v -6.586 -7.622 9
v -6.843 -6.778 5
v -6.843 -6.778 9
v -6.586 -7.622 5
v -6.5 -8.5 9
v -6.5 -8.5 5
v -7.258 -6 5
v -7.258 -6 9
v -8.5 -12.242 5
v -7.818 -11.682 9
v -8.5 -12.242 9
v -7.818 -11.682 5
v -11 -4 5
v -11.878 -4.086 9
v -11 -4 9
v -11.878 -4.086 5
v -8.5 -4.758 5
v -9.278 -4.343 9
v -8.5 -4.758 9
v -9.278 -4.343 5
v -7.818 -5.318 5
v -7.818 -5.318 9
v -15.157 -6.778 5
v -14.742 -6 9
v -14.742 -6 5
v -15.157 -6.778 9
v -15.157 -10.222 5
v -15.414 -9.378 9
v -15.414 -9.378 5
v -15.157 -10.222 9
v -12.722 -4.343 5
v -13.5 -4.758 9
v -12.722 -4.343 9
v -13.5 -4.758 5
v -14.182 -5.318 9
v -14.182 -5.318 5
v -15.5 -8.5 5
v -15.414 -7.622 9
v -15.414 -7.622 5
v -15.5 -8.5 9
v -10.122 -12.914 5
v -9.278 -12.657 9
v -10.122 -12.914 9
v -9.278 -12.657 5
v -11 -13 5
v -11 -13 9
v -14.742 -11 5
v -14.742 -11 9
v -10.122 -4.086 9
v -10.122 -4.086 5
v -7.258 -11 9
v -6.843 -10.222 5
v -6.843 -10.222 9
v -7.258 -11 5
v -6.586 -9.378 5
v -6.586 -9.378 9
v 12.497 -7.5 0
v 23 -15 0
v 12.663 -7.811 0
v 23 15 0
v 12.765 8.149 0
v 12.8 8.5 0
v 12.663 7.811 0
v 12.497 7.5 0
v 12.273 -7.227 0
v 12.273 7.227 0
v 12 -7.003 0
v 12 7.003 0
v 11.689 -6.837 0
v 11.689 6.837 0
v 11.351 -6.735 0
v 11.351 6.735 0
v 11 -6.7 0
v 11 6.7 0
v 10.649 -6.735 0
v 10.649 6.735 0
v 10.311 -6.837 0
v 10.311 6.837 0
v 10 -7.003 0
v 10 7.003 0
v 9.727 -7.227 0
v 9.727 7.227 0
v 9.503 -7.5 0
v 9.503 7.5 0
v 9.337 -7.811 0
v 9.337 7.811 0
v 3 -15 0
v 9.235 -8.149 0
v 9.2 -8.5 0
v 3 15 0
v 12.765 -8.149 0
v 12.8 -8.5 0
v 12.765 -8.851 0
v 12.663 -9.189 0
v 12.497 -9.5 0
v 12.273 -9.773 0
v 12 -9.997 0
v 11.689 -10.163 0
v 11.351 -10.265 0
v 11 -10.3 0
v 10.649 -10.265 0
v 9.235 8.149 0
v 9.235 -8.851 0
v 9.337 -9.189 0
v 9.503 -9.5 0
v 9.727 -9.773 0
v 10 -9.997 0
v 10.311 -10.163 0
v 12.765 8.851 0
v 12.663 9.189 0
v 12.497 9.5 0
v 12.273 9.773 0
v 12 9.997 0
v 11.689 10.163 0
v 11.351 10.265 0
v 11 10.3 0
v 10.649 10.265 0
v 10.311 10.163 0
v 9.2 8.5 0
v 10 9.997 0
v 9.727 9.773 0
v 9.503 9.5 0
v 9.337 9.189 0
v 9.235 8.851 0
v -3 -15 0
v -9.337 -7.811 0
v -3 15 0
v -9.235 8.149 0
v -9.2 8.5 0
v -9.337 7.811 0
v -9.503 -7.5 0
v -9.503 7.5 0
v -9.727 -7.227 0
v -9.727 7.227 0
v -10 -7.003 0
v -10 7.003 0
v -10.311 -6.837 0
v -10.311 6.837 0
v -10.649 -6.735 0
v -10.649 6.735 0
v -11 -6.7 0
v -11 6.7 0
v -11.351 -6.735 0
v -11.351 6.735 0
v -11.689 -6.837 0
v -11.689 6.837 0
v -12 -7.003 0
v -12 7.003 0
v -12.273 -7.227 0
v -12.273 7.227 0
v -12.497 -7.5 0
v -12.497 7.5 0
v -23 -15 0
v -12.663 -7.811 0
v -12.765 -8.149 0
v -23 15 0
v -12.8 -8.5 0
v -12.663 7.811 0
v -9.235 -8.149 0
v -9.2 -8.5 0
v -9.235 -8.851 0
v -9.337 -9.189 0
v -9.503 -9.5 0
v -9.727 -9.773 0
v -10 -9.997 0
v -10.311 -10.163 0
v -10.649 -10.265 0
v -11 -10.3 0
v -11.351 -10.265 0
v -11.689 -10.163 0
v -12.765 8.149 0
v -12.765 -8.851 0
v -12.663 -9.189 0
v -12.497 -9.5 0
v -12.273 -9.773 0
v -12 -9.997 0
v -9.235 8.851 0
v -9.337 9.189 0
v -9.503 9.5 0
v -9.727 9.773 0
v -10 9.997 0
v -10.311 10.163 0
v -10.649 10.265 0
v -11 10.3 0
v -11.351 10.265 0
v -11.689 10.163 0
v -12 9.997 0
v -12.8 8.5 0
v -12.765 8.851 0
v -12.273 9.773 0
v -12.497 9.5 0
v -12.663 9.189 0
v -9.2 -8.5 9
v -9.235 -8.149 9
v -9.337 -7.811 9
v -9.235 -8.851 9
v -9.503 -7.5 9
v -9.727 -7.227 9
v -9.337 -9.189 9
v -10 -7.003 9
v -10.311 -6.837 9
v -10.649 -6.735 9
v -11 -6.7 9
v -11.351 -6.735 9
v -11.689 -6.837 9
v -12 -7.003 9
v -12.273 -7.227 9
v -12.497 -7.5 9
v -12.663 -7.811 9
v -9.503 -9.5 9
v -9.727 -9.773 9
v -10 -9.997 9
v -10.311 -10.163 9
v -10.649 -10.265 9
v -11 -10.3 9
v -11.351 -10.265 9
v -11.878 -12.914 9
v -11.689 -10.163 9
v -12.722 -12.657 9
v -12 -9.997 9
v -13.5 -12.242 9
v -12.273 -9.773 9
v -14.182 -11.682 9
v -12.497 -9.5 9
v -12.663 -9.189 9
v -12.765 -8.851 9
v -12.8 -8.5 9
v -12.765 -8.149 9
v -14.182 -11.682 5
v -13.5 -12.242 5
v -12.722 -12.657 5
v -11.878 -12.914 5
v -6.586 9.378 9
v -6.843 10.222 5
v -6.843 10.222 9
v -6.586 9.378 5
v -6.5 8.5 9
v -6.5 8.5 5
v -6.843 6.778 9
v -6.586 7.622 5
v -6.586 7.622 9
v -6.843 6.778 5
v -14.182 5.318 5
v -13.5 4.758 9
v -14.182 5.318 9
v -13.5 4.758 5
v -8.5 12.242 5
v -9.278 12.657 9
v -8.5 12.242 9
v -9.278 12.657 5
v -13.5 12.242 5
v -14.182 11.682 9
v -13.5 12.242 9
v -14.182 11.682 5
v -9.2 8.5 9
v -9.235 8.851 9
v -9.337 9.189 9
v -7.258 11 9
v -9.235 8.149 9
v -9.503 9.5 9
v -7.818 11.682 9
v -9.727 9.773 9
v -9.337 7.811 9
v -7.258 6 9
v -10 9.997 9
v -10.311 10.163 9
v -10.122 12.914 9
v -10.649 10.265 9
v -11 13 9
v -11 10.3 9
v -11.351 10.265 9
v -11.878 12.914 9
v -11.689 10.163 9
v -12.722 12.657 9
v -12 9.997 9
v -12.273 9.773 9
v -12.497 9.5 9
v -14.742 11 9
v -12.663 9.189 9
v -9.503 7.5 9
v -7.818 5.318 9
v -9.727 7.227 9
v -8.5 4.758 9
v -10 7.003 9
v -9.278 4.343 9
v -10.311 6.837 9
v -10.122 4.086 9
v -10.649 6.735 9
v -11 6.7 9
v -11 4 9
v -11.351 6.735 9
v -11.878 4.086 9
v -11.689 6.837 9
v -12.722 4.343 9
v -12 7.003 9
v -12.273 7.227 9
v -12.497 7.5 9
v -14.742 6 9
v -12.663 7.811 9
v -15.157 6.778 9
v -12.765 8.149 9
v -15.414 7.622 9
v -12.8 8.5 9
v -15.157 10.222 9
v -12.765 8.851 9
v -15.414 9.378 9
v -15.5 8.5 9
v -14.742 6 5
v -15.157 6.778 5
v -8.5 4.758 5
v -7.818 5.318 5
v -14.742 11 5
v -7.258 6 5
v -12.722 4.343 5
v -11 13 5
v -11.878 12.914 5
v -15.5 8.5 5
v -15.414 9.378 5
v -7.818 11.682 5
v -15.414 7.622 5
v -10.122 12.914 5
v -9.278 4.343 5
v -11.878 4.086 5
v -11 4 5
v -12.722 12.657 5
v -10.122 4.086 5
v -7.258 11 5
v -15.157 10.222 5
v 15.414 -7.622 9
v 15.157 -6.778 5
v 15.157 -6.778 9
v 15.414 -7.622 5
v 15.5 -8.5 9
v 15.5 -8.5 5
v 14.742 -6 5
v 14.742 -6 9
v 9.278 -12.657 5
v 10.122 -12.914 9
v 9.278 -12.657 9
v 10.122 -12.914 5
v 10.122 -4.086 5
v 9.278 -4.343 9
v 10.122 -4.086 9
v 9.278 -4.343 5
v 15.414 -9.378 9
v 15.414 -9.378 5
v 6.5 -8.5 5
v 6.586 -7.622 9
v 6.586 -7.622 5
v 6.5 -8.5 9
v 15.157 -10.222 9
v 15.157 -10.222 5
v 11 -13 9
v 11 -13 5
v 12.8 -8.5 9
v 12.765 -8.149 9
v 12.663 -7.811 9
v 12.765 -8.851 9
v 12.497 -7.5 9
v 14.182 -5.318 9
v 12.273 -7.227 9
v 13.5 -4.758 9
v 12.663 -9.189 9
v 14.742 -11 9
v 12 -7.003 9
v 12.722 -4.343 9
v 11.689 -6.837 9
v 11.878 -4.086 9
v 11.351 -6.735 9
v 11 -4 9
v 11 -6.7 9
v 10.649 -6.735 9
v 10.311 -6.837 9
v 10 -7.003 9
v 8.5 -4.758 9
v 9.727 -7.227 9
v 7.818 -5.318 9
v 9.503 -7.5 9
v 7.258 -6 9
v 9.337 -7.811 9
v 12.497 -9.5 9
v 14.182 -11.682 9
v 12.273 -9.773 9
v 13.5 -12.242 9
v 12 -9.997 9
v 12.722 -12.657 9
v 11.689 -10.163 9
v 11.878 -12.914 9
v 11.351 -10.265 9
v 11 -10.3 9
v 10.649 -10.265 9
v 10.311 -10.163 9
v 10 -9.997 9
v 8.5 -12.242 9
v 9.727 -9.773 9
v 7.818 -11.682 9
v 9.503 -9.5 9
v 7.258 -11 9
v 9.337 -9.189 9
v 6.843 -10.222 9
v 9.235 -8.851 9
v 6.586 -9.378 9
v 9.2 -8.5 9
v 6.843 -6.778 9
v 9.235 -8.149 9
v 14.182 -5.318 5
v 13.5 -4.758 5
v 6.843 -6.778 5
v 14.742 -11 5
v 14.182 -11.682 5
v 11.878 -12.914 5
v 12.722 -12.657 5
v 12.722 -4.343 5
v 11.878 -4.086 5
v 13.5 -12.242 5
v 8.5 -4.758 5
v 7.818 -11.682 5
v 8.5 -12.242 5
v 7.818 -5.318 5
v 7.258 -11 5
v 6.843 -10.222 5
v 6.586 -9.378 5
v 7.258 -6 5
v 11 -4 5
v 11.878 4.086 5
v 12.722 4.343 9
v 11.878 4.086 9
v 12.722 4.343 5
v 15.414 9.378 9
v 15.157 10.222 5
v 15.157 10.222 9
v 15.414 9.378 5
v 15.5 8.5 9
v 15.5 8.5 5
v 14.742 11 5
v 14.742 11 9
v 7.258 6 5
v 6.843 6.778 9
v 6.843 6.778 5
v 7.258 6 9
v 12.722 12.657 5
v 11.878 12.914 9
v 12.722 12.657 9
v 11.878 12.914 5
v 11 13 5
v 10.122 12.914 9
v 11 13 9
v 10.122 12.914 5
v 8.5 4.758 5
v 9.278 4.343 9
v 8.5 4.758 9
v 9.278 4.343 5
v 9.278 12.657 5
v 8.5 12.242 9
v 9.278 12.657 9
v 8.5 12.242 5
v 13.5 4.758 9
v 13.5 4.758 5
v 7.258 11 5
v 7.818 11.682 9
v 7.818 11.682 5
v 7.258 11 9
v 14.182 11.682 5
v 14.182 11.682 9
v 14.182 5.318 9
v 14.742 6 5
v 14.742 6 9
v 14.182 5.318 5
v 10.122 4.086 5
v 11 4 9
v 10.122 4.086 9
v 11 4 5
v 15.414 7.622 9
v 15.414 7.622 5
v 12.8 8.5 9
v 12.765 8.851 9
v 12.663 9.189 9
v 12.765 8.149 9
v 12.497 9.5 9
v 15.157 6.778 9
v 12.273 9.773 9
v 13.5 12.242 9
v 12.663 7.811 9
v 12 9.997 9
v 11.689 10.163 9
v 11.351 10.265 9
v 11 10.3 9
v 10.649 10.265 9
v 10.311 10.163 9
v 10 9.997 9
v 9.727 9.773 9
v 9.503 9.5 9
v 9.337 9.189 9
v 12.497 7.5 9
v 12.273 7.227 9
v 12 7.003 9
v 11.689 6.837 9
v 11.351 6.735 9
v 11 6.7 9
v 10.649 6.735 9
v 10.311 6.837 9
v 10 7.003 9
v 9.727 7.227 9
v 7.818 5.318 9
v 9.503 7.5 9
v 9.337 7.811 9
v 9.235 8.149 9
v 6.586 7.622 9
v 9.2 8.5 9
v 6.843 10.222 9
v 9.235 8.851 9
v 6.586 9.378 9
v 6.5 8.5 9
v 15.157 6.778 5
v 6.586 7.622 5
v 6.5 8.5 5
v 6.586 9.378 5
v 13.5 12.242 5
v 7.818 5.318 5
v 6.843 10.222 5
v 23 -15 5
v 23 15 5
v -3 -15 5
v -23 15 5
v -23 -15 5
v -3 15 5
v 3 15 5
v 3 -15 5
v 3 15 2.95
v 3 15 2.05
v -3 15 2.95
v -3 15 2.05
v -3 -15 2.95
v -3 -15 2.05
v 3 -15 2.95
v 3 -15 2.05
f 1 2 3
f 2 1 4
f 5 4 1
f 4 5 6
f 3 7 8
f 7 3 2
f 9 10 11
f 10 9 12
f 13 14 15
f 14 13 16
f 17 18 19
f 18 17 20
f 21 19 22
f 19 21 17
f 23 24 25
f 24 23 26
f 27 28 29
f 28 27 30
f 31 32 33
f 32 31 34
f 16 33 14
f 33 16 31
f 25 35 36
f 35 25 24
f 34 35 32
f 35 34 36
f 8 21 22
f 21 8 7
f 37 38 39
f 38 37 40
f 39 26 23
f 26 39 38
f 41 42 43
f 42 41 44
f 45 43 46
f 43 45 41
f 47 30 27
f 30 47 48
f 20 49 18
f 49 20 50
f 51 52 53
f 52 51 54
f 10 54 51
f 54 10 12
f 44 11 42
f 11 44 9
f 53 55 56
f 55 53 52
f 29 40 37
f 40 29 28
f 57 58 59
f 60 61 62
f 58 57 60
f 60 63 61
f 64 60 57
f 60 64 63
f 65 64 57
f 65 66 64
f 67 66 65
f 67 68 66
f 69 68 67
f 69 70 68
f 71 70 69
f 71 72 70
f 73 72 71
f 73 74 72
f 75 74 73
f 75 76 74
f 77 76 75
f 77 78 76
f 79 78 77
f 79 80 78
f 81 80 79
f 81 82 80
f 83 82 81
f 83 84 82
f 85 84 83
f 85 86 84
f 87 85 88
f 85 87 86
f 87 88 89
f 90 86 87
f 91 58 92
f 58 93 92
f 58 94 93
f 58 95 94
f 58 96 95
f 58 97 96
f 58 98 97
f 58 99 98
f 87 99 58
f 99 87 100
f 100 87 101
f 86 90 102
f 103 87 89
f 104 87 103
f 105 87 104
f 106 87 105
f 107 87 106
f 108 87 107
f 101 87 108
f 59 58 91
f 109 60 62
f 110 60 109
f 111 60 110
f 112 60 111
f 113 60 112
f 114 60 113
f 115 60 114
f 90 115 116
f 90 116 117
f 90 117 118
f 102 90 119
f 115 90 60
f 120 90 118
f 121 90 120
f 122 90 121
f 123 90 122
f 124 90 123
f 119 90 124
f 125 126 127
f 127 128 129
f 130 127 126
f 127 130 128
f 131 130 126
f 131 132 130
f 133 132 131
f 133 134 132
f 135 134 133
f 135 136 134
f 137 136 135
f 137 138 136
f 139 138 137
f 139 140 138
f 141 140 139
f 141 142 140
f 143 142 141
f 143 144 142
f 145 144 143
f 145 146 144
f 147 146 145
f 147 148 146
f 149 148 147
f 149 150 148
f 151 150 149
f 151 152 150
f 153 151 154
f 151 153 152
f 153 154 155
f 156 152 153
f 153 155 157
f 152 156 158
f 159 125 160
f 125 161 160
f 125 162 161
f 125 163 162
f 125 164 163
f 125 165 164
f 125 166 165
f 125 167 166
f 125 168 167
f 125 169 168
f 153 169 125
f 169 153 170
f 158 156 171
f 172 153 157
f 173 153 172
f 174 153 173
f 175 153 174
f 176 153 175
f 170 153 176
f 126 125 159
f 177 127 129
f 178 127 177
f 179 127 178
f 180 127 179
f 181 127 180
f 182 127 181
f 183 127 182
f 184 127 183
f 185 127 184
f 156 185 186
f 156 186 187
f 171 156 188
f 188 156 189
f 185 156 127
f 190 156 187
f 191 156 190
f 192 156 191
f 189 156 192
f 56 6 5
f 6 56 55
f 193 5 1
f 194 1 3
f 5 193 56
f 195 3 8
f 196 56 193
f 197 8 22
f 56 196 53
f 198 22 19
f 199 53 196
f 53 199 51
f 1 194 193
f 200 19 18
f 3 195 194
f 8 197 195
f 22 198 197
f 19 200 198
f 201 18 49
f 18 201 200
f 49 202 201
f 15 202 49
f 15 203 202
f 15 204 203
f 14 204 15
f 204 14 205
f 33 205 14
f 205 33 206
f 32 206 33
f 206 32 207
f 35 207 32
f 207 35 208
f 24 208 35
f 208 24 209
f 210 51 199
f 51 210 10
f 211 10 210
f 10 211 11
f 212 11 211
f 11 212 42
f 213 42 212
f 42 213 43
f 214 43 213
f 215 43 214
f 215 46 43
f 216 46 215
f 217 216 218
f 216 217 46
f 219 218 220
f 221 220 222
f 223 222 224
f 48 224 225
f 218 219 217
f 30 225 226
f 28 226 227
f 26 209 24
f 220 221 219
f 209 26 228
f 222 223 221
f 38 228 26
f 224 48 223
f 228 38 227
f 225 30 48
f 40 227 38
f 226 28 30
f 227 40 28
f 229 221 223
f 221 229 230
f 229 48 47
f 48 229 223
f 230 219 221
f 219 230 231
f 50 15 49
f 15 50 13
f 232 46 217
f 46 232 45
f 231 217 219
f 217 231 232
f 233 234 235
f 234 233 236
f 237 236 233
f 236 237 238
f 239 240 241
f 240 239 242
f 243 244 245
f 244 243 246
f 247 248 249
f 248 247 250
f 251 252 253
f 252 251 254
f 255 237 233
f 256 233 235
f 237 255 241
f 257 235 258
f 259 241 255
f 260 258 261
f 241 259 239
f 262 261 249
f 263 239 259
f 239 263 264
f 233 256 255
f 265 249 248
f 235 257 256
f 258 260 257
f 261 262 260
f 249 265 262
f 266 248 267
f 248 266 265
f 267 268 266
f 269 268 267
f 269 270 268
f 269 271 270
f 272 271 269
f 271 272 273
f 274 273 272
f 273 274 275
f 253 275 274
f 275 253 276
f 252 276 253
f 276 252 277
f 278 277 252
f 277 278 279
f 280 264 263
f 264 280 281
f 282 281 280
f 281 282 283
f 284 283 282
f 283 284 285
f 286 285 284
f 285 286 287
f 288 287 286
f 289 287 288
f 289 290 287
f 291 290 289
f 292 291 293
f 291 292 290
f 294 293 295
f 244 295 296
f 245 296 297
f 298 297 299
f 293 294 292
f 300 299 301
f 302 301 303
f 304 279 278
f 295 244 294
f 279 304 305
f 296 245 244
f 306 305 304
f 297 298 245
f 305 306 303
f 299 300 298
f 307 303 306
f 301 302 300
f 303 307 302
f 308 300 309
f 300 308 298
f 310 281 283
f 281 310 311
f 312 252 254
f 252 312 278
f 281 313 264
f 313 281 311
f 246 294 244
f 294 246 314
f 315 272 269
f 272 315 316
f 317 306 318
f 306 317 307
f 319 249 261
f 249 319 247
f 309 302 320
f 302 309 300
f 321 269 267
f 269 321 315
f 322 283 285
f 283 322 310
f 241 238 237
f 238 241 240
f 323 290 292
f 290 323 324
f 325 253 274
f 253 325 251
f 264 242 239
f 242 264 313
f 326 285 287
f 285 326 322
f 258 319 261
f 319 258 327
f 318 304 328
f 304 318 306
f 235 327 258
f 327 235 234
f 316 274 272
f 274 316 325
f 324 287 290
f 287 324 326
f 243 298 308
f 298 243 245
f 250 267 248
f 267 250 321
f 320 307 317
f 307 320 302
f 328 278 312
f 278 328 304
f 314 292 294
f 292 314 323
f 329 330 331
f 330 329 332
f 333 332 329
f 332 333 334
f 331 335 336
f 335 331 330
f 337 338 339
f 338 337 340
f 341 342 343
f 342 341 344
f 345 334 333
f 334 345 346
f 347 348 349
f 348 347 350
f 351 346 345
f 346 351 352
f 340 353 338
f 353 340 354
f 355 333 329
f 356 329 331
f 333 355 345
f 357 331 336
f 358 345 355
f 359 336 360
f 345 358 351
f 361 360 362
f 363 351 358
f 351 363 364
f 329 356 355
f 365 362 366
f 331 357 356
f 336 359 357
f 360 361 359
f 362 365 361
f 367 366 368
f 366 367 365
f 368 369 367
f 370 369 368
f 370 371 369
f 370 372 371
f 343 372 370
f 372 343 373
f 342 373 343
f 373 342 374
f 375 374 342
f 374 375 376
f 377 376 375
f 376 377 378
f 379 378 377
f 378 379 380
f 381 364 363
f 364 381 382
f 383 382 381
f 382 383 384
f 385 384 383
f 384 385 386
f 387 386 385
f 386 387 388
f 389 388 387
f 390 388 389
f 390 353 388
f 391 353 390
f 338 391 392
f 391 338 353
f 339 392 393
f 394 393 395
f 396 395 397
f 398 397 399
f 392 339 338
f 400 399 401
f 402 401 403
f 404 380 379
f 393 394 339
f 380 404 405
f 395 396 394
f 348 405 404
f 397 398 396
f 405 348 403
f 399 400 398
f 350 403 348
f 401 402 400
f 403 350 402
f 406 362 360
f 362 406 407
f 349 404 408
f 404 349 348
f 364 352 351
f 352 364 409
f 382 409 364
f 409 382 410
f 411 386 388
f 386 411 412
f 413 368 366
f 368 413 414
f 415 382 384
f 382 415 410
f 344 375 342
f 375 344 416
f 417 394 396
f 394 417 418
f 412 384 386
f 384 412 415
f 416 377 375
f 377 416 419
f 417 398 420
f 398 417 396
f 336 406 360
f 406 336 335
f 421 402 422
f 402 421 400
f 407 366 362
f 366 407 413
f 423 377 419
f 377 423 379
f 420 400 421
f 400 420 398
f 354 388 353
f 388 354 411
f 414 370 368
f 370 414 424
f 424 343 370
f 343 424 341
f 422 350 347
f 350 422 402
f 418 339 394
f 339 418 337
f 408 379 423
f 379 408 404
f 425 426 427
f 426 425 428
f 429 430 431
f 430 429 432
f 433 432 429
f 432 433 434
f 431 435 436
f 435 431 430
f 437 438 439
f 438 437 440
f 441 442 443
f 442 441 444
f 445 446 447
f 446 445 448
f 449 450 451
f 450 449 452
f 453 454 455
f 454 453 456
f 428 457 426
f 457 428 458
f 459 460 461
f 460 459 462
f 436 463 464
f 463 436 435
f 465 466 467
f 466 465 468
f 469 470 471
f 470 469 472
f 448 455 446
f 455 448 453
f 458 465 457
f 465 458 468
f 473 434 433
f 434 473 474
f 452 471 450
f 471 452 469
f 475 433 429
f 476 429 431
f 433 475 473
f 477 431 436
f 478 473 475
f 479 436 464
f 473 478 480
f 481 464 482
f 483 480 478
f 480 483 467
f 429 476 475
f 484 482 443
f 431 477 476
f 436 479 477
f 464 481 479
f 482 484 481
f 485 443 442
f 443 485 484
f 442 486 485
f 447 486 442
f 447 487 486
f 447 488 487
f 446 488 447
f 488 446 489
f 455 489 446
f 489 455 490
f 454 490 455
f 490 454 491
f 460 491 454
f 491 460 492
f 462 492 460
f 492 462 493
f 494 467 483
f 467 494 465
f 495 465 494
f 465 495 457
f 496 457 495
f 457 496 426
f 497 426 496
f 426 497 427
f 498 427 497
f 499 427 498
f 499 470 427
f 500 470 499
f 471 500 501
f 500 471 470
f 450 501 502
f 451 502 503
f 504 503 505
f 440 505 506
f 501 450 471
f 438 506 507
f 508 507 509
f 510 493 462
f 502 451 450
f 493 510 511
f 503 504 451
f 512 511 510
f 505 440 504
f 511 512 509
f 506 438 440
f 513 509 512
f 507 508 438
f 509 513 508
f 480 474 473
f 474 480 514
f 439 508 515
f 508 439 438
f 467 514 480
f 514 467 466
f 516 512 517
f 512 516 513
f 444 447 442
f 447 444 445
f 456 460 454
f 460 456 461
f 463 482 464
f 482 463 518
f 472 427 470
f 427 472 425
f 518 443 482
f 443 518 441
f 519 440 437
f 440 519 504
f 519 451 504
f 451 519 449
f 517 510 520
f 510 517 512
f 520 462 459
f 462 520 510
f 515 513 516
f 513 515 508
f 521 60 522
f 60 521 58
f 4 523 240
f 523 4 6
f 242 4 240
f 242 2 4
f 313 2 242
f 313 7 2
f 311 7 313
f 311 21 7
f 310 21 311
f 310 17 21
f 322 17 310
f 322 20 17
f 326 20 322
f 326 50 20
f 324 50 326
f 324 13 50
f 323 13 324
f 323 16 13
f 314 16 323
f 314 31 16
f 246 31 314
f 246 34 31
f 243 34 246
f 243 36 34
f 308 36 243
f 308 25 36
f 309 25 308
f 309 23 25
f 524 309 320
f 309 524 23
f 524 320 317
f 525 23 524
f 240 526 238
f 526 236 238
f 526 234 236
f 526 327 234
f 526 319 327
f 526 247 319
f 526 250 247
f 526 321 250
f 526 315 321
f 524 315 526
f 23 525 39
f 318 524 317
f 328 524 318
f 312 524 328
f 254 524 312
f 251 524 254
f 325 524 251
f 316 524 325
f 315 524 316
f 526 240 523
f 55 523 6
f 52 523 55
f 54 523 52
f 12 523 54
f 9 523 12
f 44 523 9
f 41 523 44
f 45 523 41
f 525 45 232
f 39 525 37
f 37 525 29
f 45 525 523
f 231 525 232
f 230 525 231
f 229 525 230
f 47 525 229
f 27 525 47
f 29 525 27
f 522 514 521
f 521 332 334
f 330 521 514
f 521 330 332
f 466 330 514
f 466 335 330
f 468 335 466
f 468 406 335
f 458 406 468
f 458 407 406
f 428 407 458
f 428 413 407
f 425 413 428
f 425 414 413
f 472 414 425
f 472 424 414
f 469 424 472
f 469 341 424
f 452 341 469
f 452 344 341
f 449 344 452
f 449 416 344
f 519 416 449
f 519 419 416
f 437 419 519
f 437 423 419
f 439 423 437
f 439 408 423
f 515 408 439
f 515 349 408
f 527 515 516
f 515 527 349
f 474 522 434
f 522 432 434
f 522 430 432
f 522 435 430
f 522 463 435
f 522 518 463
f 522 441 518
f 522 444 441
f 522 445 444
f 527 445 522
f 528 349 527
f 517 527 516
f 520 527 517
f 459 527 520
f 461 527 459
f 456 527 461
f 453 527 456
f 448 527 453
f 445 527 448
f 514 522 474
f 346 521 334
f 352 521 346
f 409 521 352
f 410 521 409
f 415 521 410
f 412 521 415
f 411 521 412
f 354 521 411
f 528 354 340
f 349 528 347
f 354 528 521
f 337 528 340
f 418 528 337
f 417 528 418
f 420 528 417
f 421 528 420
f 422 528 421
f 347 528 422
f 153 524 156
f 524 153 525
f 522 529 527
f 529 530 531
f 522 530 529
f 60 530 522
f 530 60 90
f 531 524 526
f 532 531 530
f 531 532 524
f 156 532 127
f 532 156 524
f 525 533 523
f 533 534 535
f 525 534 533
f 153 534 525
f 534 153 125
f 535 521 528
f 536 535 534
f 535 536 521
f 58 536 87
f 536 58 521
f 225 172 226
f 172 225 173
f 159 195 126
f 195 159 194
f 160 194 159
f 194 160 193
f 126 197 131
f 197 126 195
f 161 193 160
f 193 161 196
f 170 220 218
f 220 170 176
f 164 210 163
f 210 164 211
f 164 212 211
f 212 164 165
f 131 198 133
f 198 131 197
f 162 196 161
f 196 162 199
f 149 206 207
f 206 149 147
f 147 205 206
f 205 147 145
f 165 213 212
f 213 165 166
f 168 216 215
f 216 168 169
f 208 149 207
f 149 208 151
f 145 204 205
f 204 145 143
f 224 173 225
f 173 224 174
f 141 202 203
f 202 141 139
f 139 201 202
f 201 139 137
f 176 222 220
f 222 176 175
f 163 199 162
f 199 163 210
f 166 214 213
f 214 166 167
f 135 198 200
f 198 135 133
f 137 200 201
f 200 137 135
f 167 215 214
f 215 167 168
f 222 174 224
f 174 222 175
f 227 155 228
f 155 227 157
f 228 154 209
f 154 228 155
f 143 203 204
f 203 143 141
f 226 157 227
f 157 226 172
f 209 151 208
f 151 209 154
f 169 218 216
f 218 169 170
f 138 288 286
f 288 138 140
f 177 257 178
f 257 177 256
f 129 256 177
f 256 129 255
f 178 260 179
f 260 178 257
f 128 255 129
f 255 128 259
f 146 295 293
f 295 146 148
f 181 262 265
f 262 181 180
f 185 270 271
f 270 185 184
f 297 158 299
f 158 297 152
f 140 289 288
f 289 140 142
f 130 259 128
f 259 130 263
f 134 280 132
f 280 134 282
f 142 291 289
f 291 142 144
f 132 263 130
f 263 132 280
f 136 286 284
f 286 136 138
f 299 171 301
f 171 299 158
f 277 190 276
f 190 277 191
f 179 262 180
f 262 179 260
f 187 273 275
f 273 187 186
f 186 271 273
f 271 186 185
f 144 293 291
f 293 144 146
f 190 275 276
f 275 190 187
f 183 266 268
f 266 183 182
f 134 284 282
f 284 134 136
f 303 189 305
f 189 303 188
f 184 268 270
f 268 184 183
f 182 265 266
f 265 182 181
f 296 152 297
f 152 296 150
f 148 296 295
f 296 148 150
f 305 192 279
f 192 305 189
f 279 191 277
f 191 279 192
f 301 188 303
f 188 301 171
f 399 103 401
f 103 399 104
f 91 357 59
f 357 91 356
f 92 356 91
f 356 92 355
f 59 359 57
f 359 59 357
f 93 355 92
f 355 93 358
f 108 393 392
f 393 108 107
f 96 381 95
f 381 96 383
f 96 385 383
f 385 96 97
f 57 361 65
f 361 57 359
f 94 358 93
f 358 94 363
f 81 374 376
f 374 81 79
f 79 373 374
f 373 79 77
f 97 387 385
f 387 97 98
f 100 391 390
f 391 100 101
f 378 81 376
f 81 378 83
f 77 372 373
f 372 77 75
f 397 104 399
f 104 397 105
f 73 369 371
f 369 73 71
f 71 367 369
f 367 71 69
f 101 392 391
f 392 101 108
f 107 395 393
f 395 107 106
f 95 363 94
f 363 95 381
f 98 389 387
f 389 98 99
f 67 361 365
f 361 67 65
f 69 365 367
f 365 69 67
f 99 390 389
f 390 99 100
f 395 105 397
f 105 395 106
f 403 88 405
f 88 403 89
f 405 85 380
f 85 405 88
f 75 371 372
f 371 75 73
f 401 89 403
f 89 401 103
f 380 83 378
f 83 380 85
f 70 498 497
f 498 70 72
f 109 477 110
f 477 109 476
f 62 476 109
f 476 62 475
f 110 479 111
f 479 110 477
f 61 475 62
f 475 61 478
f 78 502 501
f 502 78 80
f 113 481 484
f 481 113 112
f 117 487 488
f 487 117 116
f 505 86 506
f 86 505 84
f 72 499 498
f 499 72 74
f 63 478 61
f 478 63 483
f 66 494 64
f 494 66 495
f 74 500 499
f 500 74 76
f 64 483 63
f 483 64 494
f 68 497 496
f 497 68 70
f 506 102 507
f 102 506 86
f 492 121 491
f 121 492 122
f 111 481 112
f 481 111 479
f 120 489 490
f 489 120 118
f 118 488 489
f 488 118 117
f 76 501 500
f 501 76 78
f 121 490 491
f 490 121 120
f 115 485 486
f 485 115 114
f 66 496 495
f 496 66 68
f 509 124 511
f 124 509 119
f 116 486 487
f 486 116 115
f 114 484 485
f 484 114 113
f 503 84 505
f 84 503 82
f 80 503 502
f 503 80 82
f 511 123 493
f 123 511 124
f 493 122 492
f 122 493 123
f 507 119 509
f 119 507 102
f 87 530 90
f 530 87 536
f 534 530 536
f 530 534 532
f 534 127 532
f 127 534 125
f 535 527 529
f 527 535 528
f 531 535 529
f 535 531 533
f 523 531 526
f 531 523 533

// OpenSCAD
$fn = 32;

// ----------------------------------------------------------------------
// Living hinge: 46 x 30 mm plates, 0.9 mm flexible web
// ----------------------------------------------------------------------

// --- parameters (mm) ---
plate_len = 20;           // plate length outside the web
plate_w = 30;             // plate width
thick = 5;                // plate thickness
web_half = 3;             // half width of the flex band
web_t = 0.9;              // flexible web thickness
web_z = 2.05;             // web position inside the thickness
boss_d = 9;               // screw boss diameter
boss_h = 9;               // screw boss height
boss_x = 11;              // screw boss distance from the web
screw_d = 3.6;            // screw hole

difference() {
  union() {
    /* one flat strip, later thinned at the middle */
    translate([-23, -15, 0]) cube([46, 30, 5]);
    /* screw bosses, sunk 0.5 mm into the plates */
    for (sx = [-11, 11]) {
      for (sy = [-8.5, 8.5]) {
        translate([sx, sy, 0]) cylinder(h = boss_h, d = boss_d);
      }
    }
  }
  /* channel from below: leaves the web on top of it */
  translate([-3, -17.5, -2.5]) cube([6, 35, 4.55]);
  /* channel from above: thins the web down to web_t */
  translate([-3, -17.5, 2.95]) cube([6, 35, 4.55]);
  /* screw holes through the bosses */
  for (sx = [-11, 11]) {
    for (sy = [-8.5, 8.5]) {
      translate([sx, sy, -2.5]) cylinder(h = boss_h + 5, d = screw_d);
    }
  }
}
